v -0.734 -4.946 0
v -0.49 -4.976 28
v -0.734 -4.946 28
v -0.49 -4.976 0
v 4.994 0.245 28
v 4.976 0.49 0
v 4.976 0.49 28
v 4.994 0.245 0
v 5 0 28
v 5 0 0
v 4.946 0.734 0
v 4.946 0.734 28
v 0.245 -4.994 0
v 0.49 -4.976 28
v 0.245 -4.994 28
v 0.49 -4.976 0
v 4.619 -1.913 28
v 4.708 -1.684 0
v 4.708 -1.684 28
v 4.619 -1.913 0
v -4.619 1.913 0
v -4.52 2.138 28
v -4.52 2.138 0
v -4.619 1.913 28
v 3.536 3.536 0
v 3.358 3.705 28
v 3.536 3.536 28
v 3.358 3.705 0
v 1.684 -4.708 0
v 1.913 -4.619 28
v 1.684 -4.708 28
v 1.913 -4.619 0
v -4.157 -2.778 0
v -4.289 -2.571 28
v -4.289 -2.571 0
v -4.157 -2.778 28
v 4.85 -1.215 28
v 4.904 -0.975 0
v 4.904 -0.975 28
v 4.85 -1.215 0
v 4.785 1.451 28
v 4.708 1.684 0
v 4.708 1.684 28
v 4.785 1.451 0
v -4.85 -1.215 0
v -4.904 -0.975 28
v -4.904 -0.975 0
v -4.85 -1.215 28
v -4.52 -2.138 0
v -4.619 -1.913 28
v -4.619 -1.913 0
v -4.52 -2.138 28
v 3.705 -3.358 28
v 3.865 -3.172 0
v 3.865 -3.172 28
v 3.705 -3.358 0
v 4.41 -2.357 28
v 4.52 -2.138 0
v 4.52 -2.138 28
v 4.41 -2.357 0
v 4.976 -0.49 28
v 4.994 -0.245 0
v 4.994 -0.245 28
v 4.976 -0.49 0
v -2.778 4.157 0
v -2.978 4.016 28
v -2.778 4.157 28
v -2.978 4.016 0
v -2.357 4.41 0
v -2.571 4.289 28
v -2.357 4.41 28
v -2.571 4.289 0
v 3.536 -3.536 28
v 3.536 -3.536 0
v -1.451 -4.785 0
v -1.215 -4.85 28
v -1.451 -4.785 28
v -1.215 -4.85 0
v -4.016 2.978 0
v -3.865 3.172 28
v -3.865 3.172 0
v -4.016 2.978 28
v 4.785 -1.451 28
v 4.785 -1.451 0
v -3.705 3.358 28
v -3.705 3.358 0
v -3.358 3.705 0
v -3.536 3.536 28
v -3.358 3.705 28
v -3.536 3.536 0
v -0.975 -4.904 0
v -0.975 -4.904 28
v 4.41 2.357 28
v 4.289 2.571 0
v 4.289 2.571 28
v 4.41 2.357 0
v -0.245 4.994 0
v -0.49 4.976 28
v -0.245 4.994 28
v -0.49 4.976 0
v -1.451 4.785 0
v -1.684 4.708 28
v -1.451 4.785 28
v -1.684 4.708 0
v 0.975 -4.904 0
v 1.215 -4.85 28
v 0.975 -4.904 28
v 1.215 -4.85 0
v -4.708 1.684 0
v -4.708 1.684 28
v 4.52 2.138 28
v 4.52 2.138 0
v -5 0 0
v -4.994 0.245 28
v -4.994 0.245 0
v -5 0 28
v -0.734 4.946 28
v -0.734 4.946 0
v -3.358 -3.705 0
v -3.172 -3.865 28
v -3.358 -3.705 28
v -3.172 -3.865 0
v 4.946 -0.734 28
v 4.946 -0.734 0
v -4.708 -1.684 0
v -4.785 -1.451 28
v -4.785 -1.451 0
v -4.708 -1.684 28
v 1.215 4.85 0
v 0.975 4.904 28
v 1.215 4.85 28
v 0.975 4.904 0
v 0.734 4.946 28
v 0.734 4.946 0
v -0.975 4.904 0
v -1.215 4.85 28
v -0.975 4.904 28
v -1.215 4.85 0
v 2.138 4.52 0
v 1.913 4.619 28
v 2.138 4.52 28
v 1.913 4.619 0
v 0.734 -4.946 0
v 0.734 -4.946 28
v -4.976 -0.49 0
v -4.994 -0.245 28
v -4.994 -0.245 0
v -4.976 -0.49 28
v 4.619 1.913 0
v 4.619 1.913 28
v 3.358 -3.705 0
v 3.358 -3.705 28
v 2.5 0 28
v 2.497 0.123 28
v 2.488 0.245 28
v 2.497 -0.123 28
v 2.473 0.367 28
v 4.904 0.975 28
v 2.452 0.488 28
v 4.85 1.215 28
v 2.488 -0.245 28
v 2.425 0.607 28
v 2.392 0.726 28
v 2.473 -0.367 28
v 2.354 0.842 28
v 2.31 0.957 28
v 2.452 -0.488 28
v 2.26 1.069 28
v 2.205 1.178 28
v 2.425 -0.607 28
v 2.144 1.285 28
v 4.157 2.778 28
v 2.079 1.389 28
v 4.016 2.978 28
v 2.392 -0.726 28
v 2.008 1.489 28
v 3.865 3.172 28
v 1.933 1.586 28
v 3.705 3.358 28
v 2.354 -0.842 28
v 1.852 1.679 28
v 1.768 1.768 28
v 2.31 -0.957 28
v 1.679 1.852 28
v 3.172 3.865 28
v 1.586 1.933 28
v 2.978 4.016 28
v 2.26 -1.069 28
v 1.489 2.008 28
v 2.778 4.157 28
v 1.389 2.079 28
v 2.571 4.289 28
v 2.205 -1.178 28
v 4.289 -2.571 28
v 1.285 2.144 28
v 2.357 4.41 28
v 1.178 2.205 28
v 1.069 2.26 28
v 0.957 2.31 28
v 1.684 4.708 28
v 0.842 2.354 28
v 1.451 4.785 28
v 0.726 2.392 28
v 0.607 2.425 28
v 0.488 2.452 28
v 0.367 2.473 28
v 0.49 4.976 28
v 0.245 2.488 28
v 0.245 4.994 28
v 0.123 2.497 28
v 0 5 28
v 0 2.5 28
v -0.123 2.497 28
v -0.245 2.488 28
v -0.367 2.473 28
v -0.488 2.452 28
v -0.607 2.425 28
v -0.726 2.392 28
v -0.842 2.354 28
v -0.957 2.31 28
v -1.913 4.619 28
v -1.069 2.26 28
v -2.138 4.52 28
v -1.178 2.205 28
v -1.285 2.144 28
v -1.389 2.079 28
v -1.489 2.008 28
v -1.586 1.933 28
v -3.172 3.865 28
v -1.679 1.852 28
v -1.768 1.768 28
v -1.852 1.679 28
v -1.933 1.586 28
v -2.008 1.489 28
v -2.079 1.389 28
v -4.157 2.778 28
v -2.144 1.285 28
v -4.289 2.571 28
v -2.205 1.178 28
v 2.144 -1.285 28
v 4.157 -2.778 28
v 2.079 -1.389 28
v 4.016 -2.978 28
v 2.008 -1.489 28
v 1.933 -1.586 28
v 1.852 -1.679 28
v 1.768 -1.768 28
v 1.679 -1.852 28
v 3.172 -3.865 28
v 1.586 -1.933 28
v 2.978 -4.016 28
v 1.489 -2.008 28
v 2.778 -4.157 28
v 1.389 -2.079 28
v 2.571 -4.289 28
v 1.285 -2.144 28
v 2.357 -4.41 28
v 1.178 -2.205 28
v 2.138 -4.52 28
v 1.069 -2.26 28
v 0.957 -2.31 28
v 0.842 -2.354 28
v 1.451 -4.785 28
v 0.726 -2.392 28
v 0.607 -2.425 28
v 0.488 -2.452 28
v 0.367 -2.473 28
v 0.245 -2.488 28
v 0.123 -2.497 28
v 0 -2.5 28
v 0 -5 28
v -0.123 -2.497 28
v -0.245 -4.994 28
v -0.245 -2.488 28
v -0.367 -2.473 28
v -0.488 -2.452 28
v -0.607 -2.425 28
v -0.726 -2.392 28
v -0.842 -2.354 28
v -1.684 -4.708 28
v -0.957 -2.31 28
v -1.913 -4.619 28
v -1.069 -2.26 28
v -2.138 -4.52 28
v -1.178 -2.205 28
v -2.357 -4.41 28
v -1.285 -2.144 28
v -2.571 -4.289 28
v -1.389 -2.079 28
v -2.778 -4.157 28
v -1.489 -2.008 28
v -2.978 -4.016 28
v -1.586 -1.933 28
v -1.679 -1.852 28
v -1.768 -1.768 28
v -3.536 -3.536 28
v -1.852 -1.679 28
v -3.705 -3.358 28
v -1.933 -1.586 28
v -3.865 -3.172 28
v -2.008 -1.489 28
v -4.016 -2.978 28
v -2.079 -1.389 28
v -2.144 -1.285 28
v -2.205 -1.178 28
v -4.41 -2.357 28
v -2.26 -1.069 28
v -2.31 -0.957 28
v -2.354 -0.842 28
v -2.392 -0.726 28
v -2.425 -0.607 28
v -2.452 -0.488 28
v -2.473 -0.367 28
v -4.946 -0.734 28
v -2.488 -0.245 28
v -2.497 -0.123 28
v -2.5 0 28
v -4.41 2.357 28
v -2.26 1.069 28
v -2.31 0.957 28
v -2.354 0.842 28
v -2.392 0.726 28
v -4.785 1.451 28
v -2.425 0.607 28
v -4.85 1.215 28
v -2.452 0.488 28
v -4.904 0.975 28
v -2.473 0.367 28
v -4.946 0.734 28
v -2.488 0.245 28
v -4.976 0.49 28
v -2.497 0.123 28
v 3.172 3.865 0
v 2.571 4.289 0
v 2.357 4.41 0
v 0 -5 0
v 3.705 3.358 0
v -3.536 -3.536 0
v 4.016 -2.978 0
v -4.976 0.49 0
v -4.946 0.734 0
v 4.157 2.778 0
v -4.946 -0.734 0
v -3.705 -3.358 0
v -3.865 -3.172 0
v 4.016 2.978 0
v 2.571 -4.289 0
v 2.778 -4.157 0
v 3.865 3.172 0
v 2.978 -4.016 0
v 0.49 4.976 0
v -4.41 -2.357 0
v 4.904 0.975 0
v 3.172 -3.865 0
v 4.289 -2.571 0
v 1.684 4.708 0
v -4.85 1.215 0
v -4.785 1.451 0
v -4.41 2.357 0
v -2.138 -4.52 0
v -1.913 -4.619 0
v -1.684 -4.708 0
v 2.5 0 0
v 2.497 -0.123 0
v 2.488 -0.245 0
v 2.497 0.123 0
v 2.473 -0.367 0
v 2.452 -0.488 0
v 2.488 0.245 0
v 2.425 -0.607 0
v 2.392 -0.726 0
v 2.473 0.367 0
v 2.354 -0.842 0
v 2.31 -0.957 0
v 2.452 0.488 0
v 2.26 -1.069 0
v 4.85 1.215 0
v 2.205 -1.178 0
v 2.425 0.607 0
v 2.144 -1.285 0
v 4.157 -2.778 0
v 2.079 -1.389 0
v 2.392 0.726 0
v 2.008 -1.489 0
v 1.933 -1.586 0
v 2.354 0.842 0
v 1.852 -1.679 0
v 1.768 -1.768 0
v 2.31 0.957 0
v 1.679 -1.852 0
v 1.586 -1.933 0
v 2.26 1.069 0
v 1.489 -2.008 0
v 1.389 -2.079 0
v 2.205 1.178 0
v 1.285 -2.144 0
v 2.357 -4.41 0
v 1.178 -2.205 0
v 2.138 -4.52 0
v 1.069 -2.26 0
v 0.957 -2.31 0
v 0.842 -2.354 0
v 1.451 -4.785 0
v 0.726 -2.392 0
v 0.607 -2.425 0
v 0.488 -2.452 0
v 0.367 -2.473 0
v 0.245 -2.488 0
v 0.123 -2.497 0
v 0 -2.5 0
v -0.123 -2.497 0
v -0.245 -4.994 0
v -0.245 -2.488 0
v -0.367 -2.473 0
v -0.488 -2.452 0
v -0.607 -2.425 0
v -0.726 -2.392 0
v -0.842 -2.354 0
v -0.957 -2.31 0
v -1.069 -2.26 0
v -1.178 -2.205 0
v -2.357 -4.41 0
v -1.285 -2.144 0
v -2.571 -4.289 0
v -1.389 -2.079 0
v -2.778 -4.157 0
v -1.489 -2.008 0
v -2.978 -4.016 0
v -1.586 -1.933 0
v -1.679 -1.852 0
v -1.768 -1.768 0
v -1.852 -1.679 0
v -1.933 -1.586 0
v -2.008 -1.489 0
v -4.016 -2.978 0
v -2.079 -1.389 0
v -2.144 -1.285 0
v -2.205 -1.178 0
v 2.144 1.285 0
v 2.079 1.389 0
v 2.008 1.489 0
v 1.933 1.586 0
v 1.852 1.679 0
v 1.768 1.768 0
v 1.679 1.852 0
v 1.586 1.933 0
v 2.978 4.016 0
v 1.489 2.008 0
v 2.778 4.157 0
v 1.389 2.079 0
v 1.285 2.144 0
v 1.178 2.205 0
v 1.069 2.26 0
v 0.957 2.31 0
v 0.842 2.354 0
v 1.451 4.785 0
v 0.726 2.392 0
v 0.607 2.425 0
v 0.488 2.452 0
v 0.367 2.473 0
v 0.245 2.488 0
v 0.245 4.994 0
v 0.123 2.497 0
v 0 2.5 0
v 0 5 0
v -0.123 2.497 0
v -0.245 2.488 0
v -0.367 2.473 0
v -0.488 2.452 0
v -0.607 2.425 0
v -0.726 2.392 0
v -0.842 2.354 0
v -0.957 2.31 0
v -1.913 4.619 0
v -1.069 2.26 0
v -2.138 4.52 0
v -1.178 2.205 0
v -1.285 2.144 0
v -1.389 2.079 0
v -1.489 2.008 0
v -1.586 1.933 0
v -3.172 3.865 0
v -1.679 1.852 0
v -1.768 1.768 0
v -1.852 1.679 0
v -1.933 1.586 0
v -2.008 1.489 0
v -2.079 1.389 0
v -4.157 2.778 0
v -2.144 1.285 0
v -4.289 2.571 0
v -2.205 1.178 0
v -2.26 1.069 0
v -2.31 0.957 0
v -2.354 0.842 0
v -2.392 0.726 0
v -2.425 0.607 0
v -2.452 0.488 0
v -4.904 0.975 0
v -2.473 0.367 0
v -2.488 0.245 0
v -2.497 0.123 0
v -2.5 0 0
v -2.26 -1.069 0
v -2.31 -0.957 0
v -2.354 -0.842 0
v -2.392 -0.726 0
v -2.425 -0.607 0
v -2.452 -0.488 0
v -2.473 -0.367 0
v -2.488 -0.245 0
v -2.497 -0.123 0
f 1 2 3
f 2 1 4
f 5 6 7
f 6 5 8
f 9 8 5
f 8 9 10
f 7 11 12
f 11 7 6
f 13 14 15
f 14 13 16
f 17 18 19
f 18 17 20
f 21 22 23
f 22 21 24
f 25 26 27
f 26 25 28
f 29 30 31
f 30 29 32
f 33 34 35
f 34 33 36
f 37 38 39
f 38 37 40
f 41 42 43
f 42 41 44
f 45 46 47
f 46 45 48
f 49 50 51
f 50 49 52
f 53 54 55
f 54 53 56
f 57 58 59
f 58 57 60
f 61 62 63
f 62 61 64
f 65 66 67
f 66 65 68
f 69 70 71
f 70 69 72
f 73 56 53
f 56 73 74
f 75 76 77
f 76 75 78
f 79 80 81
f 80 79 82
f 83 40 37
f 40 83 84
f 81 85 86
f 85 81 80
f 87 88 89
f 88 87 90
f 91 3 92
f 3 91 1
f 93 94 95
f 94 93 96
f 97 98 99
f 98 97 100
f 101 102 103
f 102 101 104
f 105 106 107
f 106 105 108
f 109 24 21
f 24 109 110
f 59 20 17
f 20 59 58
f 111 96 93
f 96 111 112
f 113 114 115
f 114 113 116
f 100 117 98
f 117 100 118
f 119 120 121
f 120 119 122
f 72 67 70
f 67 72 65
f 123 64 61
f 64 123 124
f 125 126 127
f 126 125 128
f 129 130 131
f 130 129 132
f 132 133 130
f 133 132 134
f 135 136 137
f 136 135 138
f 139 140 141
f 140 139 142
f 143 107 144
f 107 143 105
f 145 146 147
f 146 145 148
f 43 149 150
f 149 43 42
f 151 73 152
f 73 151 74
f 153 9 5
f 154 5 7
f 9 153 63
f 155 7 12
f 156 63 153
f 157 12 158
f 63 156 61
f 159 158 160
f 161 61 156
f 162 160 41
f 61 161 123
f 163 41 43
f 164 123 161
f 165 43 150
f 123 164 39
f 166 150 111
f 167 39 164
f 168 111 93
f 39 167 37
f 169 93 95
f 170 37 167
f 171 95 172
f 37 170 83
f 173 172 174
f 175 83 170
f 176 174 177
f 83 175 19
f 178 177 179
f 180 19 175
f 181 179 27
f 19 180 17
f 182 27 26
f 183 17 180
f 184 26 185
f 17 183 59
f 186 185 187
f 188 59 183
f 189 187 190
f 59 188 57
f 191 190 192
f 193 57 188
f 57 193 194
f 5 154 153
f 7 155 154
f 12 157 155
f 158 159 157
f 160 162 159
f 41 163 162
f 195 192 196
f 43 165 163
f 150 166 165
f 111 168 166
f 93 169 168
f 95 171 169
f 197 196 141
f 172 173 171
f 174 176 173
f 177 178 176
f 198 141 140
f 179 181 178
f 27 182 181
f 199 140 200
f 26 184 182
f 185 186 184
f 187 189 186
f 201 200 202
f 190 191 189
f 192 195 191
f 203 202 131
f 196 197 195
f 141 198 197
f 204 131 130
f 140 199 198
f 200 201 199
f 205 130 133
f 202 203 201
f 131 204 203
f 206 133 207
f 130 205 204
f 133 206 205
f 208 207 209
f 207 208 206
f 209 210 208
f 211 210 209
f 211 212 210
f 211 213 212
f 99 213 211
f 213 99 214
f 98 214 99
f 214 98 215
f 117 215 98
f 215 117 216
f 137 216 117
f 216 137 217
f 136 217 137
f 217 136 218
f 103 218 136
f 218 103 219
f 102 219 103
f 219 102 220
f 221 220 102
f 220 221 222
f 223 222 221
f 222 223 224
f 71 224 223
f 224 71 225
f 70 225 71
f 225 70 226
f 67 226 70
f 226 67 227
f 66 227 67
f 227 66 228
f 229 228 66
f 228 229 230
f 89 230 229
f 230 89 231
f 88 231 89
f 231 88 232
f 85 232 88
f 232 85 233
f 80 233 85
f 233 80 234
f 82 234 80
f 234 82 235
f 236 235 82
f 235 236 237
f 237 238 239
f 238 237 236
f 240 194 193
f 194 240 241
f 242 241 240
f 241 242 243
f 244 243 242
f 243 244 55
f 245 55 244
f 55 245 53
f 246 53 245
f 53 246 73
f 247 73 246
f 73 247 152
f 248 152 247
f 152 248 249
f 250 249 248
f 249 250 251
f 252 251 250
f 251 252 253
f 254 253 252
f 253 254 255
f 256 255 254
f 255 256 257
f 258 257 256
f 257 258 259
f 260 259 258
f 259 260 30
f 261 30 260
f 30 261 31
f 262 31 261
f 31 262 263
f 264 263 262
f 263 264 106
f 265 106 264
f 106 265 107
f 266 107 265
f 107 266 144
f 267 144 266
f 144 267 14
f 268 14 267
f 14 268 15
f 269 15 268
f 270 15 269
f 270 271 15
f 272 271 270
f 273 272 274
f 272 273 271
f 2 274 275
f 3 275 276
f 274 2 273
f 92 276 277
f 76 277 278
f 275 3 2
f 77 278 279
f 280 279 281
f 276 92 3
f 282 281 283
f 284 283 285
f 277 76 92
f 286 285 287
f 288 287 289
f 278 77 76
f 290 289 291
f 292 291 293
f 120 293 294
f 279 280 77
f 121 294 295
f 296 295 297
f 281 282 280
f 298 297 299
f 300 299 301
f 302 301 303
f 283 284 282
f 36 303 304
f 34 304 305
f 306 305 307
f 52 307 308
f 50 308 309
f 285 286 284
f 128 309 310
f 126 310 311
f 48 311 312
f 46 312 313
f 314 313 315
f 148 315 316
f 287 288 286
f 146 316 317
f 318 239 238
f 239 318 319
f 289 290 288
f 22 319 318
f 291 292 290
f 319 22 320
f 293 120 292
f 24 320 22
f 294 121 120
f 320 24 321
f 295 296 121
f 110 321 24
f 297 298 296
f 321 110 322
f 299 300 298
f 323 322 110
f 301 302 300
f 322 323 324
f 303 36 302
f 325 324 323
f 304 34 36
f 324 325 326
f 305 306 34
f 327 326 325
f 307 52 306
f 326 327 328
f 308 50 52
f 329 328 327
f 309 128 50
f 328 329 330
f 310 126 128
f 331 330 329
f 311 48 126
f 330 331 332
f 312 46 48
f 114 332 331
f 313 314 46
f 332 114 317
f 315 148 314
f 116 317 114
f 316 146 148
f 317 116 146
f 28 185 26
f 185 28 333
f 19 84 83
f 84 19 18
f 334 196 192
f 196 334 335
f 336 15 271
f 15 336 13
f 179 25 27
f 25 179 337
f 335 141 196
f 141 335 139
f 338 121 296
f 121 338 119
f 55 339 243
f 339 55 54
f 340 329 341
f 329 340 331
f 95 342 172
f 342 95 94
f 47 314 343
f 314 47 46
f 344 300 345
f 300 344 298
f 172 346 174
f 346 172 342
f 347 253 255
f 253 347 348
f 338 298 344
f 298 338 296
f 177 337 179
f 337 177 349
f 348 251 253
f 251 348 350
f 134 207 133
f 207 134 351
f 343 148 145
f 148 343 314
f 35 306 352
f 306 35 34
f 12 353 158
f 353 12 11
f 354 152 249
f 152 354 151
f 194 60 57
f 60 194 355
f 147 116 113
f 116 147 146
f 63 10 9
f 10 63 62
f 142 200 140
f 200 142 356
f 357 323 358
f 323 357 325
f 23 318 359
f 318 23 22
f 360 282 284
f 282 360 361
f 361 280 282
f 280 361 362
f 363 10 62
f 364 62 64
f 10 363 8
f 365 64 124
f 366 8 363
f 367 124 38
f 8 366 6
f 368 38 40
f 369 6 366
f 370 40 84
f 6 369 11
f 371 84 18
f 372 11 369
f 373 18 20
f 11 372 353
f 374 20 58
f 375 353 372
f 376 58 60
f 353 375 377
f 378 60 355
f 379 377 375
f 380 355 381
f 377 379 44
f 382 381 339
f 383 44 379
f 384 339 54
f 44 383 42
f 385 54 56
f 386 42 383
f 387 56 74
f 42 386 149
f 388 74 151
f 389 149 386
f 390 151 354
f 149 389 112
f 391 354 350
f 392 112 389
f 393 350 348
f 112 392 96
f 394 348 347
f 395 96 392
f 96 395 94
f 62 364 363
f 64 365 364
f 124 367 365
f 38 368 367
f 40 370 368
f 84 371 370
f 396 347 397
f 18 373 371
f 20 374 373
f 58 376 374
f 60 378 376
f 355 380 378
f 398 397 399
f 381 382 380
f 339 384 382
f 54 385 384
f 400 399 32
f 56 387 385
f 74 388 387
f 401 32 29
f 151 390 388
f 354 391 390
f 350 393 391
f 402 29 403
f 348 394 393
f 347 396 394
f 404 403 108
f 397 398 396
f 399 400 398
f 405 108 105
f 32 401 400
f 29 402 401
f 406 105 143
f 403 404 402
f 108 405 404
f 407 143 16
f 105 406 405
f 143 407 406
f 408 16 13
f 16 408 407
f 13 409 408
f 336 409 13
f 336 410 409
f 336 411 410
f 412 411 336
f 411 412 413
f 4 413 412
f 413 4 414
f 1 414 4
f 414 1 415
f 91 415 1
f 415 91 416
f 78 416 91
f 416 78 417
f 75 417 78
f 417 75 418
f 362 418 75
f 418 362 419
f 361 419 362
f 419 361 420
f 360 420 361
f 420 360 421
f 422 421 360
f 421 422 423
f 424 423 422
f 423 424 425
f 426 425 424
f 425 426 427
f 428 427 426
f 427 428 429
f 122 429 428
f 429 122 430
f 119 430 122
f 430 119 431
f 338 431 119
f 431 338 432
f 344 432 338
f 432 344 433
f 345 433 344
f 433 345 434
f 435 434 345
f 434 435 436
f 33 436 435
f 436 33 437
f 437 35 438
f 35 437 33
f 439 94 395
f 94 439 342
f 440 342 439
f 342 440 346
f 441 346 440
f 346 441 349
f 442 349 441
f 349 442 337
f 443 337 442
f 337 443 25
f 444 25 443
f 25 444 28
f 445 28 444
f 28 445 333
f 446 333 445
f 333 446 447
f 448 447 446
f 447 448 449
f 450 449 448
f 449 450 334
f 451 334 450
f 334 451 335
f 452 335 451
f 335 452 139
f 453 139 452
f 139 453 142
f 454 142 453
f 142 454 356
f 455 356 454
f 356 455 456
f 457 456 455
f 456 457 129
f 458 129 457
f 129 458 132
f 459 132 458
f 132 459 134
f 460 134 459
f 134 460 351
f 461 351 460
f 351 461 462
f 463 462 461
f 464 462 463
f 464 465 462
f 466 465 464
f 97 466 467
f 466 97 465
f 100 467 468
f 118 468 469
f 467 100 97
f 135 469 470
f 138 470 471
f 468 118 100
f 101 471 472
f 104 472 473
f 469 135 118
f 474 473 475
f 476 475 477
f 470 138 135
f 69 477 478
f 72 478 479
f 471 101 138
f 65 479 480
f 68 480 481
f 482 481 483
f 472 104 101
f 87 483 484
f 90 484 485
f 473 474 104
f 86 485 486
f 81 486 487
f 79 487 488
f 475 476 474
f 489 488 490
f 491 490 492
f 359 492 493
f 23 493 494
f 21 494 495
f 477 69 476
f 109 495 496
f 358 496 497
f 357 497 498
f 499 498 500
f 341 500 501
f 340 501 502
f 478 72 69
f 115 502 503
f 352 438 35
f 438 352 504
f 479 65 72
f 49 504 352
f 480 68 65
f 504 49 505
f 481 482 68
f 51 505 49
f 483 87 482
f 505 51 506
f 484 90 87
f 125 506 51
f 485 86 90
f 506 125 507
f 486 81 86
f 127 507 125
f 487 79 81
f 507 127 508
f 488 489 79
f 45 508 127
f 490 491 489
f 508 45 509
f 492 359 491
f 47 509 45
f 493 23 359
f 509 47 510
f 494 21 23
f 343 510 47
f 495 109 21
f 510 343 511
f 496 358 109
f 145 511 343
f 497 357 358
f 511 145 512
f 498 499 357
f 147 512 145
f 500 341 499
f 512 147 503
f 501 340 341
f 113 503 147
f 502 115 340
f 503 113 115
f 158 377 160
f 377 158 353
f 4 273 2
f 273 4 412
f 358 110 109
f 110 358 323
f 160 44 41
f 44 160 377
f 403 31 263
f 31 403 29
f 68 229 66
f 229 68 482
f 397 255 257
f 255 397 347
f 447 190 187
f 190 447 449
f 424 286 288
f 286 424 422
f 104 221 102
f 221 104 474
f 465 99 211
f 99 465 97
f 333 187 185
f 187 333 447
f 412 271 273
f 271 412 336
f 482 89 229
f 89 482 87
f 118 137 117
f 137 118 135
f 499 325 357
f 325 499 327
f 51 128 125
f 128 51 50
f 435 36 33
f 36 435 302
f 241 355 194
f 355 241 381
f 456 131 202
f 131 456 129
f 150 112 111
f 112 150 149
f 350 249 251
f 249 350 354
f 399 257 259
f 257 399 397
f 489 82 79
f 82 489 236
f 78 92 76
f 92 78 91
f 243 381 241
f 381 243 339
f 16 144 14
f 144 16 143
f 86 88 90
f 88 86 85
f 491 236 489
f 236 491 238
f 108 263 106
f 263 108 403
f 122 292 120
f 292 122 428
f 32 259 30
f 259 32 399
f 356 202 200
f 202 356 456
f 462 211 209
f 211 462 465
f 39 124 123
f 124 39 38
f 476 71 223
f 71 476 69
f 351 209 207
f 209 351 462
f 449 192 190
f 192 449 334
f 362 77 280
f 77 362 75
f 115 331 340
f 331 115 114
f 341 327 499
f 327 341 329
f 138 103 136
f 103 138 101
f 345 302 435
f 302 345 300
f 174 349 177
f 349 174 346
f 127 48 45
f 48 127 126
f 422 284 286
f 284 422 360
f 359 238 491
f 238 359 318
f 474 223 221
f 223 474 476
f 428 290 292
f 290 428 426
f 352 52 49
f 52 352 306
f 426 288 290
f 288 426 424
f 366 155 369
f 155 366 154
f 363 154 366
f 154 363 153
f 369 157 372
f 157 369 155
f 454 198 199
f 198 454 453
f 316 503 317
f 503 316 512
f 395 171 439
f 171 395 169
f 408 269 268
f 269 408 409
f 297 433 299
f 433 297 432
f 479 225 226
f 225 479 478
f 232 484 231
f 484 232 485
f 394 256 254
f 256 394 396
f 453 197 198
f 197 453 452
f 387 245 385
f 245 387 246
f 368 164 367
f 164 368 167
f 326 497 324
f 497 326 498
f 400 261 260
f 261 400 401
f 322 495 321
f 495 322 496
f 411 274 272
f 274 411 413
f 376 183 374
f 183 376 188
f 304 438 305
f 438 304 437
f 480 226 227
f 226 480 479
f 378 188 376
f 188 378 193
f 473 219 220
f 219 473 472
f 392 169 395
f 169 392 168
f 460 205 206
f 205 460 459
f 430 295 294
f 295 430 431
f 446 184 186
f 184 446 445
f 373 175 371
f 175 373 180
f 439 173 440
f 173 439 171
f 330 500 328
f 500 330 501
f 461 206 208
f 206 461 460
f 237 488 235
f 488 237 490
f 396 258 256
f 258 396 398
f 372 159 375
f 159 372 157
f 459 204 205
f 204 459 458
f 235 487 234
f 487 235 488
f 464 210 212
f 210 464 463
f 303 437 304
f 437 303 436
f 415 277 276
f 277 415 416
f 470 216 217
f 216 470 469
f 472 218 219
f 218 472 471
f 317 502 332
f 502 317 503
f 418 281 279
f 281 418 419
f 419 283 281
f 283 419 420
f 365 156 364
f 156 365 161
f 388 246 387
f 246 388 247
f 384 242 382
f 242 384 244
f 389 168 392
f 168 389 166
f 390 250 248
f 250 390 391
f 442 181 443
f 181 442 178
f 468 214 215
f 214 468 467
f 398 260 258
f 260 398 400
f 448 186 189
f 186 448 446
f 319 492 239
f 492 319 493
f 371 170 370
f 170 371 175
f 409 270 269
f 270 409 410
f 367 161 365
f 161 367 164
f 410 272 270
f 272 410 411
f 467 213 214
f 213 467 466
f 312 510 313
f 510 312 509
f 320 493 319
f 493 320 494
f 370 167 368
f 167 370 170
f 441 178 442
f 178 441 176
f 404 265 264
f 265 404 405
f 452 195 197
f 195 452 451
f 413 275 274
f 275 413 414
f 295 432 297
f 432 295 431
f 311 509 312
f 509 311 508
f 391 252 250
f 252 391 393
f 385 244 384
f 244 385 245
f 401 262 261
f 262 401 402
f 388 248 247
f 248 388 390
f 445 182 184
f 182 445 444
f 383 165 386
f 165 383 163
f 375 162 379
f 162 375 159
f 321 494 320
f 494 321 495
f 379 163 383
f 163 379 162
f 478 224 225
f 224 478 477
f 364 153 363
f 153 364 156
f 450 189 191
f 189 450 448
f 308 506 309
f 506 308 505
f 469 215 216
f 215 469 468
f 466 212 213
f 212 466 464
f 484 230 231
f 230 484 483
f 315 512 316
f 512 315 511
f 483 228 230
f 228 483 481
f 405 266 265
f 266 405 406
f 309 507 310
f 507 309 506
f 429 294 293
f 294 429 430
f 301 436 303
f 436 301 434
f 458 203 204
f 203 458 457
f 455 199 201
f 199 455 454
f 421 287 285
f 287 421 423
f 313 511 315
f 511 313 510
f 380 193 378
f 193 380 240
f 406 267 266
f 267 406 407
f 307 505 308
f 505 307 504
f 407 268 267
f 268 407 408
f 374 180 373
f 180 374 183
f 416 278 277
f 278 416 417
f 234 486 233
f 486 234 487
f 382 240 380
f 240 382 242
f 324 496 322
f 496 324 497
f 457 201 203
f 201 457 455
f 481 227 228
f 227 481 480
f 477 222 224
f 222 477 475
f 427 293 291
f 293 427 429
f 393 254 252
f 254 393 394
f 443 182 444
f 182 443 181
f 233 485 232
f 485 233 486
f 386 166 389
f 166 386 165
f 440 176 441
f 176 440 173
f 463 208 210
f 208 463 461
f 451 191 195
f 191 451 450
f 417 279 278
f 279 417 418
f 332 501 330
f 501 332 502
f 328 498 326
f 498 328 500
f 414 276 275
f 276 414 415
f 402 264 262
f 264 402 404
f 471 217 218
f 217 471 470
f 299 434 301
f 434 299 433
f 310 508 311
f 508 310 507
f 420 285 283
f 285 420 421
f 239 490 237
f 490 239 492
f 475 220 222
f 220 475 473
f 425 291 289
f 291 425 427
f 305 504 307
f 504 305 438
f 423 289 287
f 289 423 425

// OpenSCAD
$fn = 128;

bore_d = 5.0;
outer_d = 10.0;
length = 28.0;

difference() {
  cylinder(d = outer_d, h = length, center = false);
  translate([0, 0, -0.1])
    cylinder(d = bore_d, h = length + 0.2, center = false);
}
